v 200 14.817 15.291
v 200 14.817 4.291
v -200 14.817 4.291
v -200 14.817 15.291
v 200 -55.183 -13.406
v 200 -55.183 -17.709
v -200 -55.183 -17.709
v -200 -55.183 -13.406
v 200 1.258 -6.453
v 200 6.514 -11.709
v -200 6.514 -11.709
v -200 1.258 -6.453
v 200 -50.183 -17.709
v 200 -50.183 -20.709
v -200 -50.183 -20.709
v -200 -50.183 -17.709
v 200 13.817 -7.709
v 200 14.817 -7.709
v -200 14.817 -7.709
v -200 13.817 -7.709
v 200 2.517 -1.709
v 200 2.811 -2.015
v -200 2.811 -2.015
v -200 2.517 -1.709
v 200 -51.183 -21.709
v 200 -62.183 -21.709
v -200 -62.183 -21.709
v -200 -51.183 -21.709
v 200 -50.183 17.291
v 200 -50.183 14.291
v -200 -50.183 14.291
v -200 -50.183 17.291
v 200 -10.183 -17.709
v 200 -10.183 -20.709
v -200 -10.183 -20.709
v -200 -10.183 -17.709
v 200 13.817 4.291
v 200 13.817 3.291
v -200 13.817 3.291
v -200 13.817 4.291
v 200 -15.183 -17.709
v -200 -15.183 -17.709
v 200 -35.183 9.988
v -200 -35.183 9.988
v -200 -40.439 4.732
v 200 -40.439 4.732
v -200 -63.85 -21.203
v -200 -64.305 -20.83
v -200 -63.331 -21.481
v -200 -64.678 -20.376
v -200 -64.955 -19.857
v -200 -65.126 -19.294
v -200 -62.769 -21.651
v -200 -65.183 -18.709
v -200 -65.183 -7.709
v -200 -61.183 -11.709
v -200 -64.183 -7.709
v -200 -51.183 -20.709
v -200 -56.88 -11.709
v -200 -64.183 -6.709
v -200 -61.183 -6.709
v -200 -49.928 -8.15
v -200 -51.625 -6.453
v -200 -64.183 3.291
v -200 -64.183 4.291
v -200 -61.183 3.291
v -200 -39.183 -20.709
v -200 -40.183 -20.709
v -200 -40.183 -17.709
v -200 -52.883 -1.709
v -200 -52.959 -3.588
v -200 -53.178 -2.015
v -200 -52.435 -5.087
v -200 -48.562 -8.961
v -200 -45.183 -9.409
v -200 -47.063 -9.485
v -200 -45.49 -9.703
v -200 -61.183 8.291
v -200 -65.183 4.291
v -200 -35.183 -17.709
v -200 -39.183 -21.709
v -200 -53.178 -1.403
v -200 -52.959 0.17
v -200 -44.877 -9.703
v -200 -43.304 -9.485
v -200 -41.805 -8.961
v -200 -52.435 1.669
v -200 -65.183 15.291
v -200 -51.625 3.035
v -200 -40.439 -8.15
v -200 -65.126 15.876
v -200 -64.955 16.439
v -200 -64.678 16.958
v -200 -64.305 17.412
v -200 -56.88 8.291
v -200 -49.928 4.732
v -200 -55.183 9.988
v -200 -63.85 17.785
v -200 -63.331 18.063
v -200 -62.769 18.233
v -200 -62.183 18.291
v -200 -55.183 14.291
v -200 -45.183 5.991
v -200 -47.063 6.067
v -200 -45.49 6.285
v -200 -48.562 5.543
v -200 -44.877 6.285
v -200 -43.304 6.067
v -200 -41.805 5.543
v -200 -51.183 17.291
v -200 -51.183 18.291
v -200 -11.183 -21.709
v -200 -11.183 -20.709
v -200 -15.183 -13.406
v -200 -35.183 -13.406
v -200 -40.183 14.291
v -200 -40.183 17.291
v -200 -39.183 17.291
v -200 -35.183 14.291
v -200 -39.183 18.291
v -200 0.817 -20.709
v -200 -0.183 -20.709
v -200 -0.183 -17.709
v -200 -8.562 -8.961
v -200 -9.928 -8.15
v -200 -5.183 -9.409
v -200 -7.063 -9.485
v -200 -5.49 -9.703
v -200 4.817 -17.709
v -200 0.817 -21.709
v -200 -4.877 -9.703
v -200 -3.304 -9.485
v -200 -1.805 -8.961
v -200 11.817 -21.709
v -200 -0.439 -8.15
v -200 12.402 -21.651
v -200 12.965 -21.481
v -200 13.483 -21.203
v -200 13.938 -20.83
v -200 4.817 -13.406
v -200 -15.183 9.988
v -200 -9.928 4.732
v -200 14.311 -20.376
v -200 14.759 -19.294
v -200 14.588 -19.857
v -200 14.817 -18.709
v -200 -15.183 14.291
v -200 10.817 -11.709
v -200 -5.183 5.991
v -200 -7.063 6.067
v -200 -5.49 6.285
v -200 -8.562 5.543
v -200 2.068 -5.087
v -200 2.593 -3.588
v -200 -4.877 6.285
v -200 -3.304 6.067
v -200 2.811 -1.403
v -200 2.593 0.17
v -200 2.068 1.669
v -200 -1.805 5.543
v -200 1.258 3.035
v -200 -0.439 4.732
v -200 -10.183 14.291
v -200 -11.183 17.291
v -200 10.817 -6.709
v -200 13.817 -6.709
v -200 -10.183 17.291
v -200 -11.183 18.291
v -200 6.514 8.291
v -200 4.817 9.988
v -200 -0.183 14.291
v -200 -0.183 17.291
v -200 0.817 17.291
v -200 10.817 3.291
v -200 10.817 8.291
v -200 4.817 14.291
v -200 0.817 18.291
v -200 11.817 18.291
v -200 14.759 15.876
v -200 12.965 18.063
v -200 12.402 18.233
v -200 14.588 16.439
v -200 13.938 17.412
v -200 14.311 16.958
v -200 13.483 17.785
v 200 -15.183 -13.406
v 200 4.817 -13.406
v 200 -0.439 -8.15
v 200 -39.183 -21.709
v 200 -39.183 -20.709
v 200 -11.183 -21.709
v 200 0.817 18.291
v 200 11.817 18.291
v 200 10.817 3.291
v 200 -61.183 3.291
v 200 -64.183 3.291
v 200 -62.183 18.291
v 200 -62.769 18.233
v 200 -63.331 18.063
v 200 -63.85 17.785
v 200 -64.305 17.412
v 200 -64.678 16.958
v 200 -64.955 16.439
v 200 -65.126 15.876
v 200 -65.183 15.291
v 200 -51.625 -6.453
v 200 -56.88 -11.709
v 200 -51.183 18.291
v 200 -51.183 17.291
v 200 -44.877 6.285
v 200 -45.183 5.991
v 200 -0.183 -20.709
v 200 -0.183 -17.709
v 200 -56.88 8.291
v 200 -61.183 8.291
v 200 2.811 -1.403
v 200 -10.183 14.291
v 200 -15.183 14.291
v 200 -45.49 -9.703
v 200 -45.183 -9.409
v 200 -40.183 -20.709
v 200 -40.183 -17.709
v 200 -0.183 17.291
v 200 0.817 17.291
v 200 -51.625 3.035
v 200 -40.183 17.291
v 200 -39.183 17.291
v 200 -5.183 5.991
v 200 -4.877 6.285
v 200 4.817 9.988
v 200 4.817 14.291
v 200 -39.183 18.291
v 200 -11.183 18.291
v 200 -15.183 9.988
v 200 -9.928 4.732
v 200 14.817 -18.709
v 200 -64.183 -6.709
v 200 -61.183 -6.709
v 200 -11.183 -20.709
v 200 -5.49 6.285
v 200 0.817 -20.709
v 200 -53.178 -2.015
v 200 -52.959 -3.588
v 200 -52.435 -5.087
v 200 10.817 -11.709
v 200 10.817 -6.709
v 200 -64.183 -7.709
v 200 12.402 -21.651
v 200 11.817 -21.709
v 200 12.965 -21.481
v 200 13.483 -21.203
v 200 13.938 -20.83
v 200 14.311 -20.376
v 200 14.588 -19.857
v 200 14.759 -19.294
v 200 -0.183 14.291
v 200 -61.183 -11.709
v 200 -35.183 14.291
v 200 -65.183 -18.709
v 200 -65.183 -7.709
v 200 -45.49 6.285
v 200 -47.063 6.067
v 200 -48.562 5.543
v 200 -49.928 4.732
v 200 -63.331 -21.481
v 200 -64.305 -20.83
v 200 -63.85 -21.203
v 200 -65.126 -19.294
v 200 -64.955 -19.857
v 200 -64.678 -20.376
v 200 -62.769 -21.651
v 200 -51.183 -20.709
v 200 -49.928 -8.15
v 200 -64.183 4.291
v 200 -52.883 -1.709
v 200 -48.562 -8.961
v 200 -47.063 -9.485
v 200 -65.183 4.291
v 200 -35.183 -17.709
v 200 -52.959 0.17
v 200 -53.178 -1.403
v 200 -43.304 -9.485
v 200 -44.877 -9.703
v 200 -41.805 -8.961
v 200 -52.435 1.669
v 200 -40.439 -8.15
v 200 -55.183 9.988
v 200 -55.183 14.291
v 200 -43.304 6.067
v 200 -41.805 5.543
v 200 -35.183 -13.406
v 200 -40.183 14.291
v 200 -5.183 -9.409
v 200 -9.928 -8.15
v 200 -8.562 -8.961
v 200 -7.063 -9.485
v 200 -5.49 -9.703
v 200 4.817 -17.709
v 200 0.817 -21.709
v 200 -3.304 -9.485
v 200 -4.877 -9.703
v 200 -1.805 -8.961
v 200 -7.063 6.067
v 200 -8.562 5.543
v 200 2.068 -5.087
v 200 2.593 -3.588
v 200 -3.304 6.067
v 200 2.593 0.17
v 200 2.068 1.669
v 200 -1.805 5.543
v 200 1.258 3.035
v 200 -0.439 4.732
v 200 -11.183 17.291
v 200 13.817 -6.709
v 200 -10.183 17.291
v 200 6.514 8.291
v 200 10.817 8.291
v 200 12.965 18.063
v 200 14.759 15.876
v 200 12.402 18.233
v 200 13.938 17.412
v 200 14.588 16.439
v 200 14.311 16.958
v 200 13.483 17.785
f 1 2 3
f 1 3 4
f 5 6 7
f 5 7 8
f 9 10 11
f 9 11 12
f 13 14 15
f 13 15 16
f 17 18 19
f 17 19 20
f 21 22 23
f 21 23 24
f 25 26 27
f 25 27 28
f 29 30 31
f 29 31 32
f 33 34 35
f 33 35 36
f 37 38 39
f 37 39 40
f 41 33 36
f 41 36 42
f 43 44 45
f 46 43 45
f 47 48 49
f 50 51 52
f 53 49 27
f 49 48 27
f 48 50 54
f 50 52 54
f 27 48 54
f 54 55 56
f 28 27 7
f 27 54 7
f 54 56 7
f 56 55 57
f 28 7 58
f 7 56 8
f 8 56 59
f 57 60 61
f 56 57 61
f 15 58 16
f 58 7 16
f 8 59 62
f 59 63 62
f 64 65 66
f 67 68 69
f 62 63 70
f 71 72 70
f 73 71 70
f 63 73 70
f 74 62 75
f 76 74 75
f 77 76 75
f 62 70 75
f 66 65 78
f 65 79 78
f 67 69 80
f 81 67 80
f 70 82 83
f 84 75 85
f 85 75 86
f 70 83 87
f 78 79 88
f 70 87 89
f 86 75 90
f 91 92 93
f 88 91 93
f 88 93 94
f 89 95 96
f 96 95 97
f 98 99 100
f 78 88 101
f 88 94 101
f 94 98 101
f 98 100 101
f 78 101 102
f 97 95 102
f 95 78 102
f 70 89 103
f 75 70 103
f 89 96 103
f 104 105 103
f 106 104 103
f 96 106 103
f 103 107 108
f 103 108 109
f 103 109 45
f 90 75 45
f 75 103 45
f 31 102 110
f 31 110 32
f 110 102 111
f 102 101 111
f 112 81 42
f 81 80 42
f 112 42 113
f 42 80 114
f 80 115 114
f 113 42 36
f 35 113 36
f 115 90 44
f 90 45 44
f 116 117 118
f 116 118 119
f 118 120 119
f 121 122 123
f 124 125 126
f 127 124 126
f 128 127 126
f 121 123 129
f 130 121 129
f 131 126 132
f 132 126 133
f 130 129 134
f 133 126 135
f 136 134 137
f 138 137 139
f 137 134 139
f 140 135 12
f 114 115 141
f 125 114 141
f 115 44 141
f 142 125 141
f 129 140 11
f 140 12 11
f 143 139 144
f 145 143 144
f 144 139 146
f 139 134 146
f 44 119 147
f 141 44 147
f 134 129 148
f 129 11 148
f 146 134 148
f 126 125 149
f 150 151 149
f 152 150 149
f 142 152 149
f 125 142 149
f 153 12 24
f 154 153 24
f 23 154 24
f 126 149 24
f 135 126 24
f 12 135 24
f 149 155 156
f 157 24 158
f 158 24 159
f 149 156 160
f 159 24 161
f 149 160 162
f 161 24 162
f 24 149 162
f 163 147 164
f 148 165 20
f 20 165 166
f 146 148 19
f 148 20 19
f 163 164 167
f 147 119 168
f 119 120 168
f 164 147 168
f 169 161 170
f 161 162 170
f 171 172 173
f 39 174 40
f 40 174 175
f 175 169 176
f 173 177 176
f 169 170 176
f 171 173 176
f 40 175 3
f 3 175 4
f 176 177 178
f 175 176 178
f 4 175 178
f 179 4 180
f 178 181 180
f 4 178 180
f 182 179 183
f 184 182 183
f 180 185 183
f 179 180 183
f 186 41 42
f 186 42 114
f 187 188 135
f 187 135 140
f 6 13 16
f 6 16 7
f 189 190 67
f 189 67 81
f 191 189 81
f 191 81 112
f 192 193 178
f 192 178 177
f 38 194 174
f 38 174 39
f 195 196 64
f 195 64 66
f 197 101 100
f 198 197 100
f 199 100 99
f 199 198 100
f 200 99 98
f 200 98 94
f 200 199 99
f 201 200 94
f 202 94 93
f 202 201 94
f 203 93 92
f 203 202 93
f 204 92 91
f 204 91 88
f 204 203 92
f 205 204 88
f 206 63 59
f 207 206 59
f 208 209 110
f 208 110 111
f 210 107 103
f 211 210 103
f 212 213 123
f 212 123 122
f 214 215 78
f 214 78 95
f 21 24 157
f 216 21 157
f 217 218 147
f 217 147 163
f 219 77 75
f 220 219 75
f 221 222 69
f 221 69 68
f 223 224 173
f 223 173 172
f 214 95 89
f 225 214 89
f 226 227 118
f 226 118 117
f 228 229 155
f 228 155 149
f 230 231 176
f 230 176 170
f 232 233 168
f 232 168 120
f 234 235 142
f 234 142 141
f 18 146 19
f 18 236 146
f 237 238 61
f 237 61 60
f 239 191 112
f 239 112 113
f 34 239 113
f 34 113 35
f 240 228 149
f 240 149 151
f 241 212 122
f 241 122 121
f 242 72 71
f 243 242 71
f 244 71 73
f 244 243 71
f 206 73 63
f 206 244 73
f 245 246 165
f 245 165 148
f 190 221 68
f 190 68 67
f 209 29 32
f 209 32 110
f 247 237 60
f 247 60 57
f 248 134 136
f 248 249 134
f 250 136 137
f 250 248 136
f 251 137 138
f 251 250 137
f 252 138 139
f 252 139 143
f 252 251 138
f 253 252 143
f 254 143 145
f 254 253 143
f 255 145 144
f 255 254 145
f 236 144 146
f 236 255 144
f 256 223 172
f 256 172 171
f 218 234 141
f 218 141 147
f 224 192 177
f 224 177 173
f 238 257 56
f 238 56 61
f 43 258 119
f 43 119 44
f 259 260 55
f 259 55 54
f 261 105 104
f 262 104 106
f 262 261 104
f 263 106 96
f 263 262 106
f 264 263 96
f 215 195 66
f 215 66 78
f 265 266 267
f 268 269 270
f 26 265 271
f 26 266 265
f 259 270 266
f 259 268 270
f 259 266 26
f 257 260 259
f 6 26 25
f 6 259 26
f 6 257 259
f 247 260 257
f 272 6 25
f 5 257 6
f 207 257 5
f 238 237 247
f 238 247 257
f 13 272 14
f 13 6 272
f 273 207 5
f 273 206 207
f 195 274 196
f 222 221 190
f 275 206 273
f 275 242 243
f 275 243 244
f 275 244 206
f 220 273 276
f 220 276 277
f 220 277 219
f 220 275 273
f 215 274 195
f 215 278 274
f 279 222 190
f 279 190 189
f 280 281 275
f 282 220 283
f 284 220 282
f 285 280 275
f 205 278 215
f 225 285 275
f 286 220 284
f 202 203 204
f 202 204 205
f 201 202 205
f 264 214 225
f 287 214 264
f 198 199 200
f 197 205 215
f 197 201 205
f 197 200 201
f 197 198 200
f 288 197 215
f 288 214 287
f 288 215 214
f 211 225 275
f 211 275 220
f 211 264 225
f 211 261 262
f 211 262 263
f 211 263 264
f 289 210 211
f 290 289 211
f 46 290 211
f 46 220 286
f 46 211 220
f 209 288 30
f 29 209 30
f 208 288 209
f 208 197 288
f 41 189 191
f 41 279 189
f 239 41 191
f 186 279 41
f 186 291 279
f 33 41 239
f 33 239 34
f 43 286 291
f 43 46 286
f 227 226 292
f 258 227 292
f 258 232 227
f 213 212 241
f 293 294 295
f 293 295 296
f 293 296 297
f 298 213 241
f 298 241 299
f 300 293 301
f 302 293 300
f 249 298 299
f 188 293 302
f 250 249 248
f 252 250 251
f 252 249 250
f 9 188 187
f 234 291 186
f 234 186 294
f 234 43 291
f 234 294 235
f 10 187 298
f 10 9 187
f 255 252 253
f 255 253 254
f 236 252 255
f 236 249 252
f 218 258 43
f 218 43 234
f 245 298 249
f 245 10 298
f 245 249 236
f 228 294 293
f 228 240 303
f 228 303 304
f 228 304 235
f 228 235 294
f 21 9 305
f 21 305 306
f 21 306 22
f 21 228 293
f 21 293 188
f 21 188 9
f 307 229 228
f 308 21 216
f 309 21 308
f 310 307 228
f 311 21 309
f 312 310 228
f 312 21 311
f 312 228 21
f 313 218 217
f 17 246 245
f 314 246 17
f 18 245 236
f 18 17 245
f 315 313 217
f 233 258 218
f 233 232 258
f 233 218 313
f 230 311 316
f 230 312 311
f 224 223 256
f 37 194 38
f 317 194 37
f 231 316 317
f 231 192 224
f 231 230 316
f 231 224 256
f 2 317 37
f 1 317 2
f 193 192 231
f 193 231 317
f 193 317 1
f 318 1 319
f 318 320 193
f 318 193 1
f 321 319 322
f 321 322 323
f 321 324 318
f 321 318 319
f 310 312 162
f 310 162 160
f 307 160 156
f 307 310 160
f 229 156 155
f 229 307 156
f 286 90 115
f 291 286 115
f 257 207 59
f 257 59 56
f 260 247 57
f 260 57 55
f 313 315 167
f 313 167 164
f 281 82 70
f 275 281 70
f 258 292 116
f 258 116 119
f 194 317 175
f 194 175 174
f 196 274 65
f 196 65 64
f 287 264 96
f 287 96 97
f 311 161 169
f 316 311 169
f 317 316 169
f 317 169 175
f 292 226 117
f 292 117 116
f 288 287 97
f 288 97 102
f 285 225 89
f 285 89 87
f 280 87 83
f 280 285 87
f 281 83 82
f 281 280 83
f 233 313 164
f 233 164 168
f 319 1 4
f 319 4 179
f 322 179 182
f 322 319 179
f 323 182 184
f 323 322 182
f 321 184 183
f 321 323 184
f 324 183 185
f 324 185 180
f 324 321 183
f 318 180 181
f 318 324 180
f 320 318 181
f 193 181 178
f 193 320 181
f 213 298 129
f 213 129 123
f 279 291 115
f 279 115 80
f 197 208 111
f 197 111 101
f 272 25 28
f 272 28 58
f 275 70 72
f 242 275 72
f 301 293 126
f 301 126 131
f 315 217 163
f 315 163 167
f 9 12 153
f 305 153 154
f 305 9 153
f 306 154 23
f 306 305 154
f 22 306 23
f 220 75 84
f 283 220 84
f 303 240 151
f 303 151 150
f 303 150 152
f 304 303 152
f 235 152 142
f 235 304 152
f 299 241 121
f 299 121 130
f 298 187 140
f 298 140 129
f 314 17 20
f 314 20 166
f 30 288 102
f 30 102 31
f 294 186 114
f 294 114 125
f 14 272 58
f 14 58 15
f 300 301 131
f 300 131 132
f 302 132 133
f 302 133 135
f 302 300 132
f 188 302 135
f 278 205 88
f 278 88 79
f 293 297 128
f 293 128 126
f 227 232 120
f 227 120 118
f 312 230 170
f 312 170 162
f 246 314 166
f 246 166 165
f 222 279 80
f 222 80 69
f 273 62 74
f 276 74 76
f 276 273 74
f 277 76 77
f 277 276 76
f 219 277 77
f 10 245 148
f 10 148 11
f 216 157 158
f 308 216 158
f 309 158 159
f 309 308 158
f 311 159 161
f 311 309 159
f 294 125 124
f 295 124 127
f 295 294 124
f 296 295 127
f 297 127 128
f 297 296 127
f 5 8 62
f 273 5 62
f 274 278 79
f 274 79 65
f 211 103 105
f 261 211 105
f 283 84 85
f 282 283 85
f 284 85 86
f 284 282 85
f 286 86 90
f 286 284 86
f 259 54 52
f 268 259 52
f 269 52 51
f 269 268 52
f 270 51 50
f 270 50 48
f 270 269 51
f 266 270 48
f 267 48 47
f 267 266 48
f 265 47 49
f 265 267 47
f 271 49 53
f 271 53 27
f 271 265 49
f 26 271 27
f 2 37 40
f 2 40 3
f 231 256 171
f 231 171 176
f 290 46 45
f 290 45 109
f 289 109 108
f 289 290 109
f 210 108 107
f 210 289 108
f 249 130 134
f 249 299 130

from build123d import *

# Parameters (mm, degrees)
F1_DEPTH = 200


with BuildPart() as f1:
    # F0 (on Right) → F1 (new body, symmetric)
    with BuildSketch(Plane.YZ):
        with BuildLine():
            Line((14.816626, -18.709014), (14.816626, -7.709014))
            Line((14.816626, -7.709014), (13.816626, -7.709014))
            Line((13.816626, -7.709014), (13.816626, -6.709014))
            Line((13.816626, -6.709014), (10.816626, -6.709014))
            Line((10.816626, -6.709014), (10.816626, -11.709014))
            Line((10.816626, -11.709014), (6.513682, -11.709014))
            Line((6.513682, -11.709014), (1.258007, -6.453339))
            ThreePointArc((1.258007, -6.453339), (2.36777, -4.351026), (2.810756, -2.01542))
            Line((2.810756, -2.01542), (2.516626, -1.709014))
            Line((2.516626, -1.709014), (2.810756, -1.402608))
            ThreePointArc((2.810756, -1.402608), (2.36777, 0.932998), (1.258007, 3.03531))
            Line((1.258007, 3.03531), (6.513682, 8.290986))
            Line((6.513682, 8.290986), (10.816626, 8.290986))
            Line((10.816626, 8.290986), (10.816626, 3.290986))
            Line((10.816626, 3.290986), (13.816626, 3.290986))
            Line((13.816626, 3.290986), (13.816626, 4.290986))
            Line((13.816626, 4.290986), (14.816626, 4.290986))
            Line((14.816626, 4.290986), (14.816626, 15.290986))
            ThreePointArc((14.816626, 15.290986), (13.937946, 17.412306), (11.816626, 18.290986))
            Line((11.816626, 18.290986), (0.816626, 18.290986))
            Line((0.816626, 18.290986), (0.816626, 17.290986))
            Line((0.816626, 17.290986), (-0.183374, 17.290986))
            Line((-0.183374, 17.290986), (-0.183374, 14.290986))
            Line((-0.183374, 14.290986), (4.816626, 14.290986))
            Line((4.816626, 14.290986), (4.816626, 9.988042))
            Line((4.816626, 9.988042), (-0.43905, 4.732367))
            ThreePointArc((-0.43905, 4.732367), (-2.541362, 5.84213), (-4.876968, 6.285116))
            Line((-4.876968, 6.285116), (-5.183374, 5.990986))
            Line((-5.183374, 5.990986), (-5.48978, 6.285116))
            ThreePointArc((-5.48978, 6.285116), (-7.825386, 5.84213), (-9.927699, 4.732367))
            Line((-9.927699, 4.732367), (-15.183374, 9.988042))
            Line((-15.183374, 9.988042), (-15.183374, 14.290986))
            Line((-15.183374, 14.290986), (-10.183374, 14.290986))
            Line((-10.183374, 14.290986), (-10.183374, 17.290986))
            Line((-10.183374, 17.290986), (-11.183374, 17.290986))
            Line((-11.183374, 17.290986), (-11.183374, 18.290986))
            Line((-11.183374, 18.290986), (-39.183374, 18.290986))
            Line((-39.183374, 18.290986), (-39.183374, 17.290986))
            Line((-39.183374, 17.290986), (-40.183374, 17.290986))
            Line((-40.183374, 17.290986), (-40.183374, 14.290986))
            Line((-40.183374, 14.290986), (-35.183374, 14.290986))
            Line((-35.183374, 14.290986), (-35.183374, 9.988042))
            Line((-35.183374, 9.988042), (-40.43905, 4.732367))
            ThreePointArc((-40.43905, 4.732367), (-42.541362, 5.84213), (-44.876968, 6.285116))
            Line((-44.876968, 6.285116), (-45.183374, 5.990986))
            Line((-45.183374, 5.990986), (-45.48978, 6.285116))
            ThreePointArc((-45.48978, 6.285116), (-47.825386, 5.84213), (-49.927699, 4.732367))
            Line((-49.927699, 4.732367), (-55.183374, 9.988042))
            Line((-55.183374, 9.988042), (-55.183374, 14.290986))
            Line((-55.183374, 14.290986), (-50.183374, 14.290986))
            Line((-50.183374, 14.290986), (-50.183374, 17.290986))
            Line((-50.183374, 17.290986), (-51.183374, 17.290986))
            Line((-51.183374, 17.290986), (-51.183374, 18.290986))
            Line((-51.183374, 18.290986), (-62.183374, 18.290986))
            ThreePointArc((-62.183374, 18.290986), (-64.304694, 17.412306), (-65.183374, 15.290986))
            Line((-65.183374, 15.290986), (-65.183374, 4.290986))
            Line((-65.183374, 4.290986), (-64.183374, 4.290986))
            Line((-64.183374, 4.290986), (-64.183374, 3.290986))
            Line((-64.183374, 3.290986), (-61.183374, 3.290986))
            Line((-61.183374, 3.290986), (-61.183374, 8.290986))
            Line((-61.183374, 8.290986), (-56.88043, 8.290986))
            Line((-56.88043, 8.290986), (-51.624755, 3.03531))
            ThreePointArc((-51.624755, 3.03531), (-52.734518, 0.932998), (-53.177504, -1.402608))
            Line((-53.177504, -1.402608), (-52.883374, -1.709014))
            Line((-52.883374, -1.709014), (-53.177504, -2.01542))
            ThreePointArc((-53.177504, -2.01542), (-52.734518, -4.351026), (-51.624755, -6.453339))
            Line((-51.624755, -6.453339), (-56.88043, -11.709014))
            Line((-56.88043, -11.709014), (-61.183374, -11.709014))
            Line((-61.183374, -11.709014), (-61.183374, -6.709014))
            Line((-61.183374, -6.709014), (-64.183374, -6.709014))
            Line((-64.183374, -6.709014), (-64.183374, -7.709014))
            Line((-64.183374, -7.709014), (-65.183374, -7.709014))
            Line((-65.183374, -7.709014), (-65.183374, -18.709014))
            ThreePointArc((-65.183374, -18.709014), (-64.304694, -20.830334), (-62.183374, -21.709014))
            Line((-62.183374, -21.709014), (-51.183374, -21.709014))
            Line((-51.183374, -21.709014), (-51.183374, -20.709014))
            Line((-51.183374, -20.709014), (-50.183374, -20.709014))
            Line((-50.183374, -20.709014), (-50.183374, -17.709014))
            Line((-50.183374, -17.709014), (-55.183374, -17.709014))
            Line((-55.183374, -17.709014), (-55.183374, -13.40607))
            Line((-55.183374, -13.40607), (-49.927699, -8.150395))
            ThreePointArc((-49.927699, -8.150395), (-47.825386, -9.260158), (-45.48978, -9.703144))
            Line((-45.48978, -9.703144), (-45.183374, -9.409014))
            Line((-45.183374, -9.409014), (-44.876968, -9.703144))
            ThreePointArc((-44.876968, -9.703144), (-42.541362, -9.260158), (-40.43905, -8.150395))
            Line((-40.43905, -8.150395), (-35.183374, -13.40607))
            Line((-35.183374, -13.40607), (-35.183374, -17.709014))
            Line((-35.183374, -17.709014), (-40.183374, -17.709014))
            Line((-40.183374, -17.709014), (-40.183374, -20.709014))
            Line((-40.183374, -20.709014), (-39.183374, -20.709014))
            Line((-39.183374, -20.709014), (-39.183374, -21.709014))
            Line((-39.183374, -21.709014), (-11.183374, -21.709014))
            Line((-11.183374, -21.709014), (-11.183374, -20.709014))
            Line((-11.183374, -20.709014), (-10.183374, -20.709014))
            Line((-10.183374, -20.709014), (-10.183374, -17.709014))
            Line((-10.183374, -17.709014), (-15.183374, -17.709014))
            Line((-15.183374, -17.709014), (-15.183374, -13.40607))
            Line((-15.183374, -13.40607), (-9.927699, -8.150395))
            ThreePointArc((-9.927699, -8.150395), (-7.825386, -9.260158), (-5.48978, -9.703144))
            Line((-5.48978, -9.703144), (-5.183374, -9.409014))
            Line((-5.183374, -9.409014), (-4.876968, -9.703144))
            ThreePointArc((-4.876968, -9.703144), (-2.541362, -9.260158), (-0.43905, -8.150395))
            Line((-0.43905, -8.150395), (4.816626, -13.40607))
            Line((4.816626, -13.40607), (4.816626, -17.709014))
            Line((4.816626, -17.709014), (-0.183374, -17.709014))
            Line((-0.183374, -17.709014), (-0.183374, -20.709014))
            Line((-0.183374, -20.709014), (0.816626, -20.709014))
            Line((0.816626, -20.709014), (0.816626, -21.709014))
            Line((0.816626, -21.709014), (11.816626, -21.709014))
            ThreePointArc((11.816626, -21.709014), (13.937946, -20.830334), (14.816626, -18.709014))
        make_face()
    extrude(amount=F1_DEPTH, both=True)


solid = f1.part
